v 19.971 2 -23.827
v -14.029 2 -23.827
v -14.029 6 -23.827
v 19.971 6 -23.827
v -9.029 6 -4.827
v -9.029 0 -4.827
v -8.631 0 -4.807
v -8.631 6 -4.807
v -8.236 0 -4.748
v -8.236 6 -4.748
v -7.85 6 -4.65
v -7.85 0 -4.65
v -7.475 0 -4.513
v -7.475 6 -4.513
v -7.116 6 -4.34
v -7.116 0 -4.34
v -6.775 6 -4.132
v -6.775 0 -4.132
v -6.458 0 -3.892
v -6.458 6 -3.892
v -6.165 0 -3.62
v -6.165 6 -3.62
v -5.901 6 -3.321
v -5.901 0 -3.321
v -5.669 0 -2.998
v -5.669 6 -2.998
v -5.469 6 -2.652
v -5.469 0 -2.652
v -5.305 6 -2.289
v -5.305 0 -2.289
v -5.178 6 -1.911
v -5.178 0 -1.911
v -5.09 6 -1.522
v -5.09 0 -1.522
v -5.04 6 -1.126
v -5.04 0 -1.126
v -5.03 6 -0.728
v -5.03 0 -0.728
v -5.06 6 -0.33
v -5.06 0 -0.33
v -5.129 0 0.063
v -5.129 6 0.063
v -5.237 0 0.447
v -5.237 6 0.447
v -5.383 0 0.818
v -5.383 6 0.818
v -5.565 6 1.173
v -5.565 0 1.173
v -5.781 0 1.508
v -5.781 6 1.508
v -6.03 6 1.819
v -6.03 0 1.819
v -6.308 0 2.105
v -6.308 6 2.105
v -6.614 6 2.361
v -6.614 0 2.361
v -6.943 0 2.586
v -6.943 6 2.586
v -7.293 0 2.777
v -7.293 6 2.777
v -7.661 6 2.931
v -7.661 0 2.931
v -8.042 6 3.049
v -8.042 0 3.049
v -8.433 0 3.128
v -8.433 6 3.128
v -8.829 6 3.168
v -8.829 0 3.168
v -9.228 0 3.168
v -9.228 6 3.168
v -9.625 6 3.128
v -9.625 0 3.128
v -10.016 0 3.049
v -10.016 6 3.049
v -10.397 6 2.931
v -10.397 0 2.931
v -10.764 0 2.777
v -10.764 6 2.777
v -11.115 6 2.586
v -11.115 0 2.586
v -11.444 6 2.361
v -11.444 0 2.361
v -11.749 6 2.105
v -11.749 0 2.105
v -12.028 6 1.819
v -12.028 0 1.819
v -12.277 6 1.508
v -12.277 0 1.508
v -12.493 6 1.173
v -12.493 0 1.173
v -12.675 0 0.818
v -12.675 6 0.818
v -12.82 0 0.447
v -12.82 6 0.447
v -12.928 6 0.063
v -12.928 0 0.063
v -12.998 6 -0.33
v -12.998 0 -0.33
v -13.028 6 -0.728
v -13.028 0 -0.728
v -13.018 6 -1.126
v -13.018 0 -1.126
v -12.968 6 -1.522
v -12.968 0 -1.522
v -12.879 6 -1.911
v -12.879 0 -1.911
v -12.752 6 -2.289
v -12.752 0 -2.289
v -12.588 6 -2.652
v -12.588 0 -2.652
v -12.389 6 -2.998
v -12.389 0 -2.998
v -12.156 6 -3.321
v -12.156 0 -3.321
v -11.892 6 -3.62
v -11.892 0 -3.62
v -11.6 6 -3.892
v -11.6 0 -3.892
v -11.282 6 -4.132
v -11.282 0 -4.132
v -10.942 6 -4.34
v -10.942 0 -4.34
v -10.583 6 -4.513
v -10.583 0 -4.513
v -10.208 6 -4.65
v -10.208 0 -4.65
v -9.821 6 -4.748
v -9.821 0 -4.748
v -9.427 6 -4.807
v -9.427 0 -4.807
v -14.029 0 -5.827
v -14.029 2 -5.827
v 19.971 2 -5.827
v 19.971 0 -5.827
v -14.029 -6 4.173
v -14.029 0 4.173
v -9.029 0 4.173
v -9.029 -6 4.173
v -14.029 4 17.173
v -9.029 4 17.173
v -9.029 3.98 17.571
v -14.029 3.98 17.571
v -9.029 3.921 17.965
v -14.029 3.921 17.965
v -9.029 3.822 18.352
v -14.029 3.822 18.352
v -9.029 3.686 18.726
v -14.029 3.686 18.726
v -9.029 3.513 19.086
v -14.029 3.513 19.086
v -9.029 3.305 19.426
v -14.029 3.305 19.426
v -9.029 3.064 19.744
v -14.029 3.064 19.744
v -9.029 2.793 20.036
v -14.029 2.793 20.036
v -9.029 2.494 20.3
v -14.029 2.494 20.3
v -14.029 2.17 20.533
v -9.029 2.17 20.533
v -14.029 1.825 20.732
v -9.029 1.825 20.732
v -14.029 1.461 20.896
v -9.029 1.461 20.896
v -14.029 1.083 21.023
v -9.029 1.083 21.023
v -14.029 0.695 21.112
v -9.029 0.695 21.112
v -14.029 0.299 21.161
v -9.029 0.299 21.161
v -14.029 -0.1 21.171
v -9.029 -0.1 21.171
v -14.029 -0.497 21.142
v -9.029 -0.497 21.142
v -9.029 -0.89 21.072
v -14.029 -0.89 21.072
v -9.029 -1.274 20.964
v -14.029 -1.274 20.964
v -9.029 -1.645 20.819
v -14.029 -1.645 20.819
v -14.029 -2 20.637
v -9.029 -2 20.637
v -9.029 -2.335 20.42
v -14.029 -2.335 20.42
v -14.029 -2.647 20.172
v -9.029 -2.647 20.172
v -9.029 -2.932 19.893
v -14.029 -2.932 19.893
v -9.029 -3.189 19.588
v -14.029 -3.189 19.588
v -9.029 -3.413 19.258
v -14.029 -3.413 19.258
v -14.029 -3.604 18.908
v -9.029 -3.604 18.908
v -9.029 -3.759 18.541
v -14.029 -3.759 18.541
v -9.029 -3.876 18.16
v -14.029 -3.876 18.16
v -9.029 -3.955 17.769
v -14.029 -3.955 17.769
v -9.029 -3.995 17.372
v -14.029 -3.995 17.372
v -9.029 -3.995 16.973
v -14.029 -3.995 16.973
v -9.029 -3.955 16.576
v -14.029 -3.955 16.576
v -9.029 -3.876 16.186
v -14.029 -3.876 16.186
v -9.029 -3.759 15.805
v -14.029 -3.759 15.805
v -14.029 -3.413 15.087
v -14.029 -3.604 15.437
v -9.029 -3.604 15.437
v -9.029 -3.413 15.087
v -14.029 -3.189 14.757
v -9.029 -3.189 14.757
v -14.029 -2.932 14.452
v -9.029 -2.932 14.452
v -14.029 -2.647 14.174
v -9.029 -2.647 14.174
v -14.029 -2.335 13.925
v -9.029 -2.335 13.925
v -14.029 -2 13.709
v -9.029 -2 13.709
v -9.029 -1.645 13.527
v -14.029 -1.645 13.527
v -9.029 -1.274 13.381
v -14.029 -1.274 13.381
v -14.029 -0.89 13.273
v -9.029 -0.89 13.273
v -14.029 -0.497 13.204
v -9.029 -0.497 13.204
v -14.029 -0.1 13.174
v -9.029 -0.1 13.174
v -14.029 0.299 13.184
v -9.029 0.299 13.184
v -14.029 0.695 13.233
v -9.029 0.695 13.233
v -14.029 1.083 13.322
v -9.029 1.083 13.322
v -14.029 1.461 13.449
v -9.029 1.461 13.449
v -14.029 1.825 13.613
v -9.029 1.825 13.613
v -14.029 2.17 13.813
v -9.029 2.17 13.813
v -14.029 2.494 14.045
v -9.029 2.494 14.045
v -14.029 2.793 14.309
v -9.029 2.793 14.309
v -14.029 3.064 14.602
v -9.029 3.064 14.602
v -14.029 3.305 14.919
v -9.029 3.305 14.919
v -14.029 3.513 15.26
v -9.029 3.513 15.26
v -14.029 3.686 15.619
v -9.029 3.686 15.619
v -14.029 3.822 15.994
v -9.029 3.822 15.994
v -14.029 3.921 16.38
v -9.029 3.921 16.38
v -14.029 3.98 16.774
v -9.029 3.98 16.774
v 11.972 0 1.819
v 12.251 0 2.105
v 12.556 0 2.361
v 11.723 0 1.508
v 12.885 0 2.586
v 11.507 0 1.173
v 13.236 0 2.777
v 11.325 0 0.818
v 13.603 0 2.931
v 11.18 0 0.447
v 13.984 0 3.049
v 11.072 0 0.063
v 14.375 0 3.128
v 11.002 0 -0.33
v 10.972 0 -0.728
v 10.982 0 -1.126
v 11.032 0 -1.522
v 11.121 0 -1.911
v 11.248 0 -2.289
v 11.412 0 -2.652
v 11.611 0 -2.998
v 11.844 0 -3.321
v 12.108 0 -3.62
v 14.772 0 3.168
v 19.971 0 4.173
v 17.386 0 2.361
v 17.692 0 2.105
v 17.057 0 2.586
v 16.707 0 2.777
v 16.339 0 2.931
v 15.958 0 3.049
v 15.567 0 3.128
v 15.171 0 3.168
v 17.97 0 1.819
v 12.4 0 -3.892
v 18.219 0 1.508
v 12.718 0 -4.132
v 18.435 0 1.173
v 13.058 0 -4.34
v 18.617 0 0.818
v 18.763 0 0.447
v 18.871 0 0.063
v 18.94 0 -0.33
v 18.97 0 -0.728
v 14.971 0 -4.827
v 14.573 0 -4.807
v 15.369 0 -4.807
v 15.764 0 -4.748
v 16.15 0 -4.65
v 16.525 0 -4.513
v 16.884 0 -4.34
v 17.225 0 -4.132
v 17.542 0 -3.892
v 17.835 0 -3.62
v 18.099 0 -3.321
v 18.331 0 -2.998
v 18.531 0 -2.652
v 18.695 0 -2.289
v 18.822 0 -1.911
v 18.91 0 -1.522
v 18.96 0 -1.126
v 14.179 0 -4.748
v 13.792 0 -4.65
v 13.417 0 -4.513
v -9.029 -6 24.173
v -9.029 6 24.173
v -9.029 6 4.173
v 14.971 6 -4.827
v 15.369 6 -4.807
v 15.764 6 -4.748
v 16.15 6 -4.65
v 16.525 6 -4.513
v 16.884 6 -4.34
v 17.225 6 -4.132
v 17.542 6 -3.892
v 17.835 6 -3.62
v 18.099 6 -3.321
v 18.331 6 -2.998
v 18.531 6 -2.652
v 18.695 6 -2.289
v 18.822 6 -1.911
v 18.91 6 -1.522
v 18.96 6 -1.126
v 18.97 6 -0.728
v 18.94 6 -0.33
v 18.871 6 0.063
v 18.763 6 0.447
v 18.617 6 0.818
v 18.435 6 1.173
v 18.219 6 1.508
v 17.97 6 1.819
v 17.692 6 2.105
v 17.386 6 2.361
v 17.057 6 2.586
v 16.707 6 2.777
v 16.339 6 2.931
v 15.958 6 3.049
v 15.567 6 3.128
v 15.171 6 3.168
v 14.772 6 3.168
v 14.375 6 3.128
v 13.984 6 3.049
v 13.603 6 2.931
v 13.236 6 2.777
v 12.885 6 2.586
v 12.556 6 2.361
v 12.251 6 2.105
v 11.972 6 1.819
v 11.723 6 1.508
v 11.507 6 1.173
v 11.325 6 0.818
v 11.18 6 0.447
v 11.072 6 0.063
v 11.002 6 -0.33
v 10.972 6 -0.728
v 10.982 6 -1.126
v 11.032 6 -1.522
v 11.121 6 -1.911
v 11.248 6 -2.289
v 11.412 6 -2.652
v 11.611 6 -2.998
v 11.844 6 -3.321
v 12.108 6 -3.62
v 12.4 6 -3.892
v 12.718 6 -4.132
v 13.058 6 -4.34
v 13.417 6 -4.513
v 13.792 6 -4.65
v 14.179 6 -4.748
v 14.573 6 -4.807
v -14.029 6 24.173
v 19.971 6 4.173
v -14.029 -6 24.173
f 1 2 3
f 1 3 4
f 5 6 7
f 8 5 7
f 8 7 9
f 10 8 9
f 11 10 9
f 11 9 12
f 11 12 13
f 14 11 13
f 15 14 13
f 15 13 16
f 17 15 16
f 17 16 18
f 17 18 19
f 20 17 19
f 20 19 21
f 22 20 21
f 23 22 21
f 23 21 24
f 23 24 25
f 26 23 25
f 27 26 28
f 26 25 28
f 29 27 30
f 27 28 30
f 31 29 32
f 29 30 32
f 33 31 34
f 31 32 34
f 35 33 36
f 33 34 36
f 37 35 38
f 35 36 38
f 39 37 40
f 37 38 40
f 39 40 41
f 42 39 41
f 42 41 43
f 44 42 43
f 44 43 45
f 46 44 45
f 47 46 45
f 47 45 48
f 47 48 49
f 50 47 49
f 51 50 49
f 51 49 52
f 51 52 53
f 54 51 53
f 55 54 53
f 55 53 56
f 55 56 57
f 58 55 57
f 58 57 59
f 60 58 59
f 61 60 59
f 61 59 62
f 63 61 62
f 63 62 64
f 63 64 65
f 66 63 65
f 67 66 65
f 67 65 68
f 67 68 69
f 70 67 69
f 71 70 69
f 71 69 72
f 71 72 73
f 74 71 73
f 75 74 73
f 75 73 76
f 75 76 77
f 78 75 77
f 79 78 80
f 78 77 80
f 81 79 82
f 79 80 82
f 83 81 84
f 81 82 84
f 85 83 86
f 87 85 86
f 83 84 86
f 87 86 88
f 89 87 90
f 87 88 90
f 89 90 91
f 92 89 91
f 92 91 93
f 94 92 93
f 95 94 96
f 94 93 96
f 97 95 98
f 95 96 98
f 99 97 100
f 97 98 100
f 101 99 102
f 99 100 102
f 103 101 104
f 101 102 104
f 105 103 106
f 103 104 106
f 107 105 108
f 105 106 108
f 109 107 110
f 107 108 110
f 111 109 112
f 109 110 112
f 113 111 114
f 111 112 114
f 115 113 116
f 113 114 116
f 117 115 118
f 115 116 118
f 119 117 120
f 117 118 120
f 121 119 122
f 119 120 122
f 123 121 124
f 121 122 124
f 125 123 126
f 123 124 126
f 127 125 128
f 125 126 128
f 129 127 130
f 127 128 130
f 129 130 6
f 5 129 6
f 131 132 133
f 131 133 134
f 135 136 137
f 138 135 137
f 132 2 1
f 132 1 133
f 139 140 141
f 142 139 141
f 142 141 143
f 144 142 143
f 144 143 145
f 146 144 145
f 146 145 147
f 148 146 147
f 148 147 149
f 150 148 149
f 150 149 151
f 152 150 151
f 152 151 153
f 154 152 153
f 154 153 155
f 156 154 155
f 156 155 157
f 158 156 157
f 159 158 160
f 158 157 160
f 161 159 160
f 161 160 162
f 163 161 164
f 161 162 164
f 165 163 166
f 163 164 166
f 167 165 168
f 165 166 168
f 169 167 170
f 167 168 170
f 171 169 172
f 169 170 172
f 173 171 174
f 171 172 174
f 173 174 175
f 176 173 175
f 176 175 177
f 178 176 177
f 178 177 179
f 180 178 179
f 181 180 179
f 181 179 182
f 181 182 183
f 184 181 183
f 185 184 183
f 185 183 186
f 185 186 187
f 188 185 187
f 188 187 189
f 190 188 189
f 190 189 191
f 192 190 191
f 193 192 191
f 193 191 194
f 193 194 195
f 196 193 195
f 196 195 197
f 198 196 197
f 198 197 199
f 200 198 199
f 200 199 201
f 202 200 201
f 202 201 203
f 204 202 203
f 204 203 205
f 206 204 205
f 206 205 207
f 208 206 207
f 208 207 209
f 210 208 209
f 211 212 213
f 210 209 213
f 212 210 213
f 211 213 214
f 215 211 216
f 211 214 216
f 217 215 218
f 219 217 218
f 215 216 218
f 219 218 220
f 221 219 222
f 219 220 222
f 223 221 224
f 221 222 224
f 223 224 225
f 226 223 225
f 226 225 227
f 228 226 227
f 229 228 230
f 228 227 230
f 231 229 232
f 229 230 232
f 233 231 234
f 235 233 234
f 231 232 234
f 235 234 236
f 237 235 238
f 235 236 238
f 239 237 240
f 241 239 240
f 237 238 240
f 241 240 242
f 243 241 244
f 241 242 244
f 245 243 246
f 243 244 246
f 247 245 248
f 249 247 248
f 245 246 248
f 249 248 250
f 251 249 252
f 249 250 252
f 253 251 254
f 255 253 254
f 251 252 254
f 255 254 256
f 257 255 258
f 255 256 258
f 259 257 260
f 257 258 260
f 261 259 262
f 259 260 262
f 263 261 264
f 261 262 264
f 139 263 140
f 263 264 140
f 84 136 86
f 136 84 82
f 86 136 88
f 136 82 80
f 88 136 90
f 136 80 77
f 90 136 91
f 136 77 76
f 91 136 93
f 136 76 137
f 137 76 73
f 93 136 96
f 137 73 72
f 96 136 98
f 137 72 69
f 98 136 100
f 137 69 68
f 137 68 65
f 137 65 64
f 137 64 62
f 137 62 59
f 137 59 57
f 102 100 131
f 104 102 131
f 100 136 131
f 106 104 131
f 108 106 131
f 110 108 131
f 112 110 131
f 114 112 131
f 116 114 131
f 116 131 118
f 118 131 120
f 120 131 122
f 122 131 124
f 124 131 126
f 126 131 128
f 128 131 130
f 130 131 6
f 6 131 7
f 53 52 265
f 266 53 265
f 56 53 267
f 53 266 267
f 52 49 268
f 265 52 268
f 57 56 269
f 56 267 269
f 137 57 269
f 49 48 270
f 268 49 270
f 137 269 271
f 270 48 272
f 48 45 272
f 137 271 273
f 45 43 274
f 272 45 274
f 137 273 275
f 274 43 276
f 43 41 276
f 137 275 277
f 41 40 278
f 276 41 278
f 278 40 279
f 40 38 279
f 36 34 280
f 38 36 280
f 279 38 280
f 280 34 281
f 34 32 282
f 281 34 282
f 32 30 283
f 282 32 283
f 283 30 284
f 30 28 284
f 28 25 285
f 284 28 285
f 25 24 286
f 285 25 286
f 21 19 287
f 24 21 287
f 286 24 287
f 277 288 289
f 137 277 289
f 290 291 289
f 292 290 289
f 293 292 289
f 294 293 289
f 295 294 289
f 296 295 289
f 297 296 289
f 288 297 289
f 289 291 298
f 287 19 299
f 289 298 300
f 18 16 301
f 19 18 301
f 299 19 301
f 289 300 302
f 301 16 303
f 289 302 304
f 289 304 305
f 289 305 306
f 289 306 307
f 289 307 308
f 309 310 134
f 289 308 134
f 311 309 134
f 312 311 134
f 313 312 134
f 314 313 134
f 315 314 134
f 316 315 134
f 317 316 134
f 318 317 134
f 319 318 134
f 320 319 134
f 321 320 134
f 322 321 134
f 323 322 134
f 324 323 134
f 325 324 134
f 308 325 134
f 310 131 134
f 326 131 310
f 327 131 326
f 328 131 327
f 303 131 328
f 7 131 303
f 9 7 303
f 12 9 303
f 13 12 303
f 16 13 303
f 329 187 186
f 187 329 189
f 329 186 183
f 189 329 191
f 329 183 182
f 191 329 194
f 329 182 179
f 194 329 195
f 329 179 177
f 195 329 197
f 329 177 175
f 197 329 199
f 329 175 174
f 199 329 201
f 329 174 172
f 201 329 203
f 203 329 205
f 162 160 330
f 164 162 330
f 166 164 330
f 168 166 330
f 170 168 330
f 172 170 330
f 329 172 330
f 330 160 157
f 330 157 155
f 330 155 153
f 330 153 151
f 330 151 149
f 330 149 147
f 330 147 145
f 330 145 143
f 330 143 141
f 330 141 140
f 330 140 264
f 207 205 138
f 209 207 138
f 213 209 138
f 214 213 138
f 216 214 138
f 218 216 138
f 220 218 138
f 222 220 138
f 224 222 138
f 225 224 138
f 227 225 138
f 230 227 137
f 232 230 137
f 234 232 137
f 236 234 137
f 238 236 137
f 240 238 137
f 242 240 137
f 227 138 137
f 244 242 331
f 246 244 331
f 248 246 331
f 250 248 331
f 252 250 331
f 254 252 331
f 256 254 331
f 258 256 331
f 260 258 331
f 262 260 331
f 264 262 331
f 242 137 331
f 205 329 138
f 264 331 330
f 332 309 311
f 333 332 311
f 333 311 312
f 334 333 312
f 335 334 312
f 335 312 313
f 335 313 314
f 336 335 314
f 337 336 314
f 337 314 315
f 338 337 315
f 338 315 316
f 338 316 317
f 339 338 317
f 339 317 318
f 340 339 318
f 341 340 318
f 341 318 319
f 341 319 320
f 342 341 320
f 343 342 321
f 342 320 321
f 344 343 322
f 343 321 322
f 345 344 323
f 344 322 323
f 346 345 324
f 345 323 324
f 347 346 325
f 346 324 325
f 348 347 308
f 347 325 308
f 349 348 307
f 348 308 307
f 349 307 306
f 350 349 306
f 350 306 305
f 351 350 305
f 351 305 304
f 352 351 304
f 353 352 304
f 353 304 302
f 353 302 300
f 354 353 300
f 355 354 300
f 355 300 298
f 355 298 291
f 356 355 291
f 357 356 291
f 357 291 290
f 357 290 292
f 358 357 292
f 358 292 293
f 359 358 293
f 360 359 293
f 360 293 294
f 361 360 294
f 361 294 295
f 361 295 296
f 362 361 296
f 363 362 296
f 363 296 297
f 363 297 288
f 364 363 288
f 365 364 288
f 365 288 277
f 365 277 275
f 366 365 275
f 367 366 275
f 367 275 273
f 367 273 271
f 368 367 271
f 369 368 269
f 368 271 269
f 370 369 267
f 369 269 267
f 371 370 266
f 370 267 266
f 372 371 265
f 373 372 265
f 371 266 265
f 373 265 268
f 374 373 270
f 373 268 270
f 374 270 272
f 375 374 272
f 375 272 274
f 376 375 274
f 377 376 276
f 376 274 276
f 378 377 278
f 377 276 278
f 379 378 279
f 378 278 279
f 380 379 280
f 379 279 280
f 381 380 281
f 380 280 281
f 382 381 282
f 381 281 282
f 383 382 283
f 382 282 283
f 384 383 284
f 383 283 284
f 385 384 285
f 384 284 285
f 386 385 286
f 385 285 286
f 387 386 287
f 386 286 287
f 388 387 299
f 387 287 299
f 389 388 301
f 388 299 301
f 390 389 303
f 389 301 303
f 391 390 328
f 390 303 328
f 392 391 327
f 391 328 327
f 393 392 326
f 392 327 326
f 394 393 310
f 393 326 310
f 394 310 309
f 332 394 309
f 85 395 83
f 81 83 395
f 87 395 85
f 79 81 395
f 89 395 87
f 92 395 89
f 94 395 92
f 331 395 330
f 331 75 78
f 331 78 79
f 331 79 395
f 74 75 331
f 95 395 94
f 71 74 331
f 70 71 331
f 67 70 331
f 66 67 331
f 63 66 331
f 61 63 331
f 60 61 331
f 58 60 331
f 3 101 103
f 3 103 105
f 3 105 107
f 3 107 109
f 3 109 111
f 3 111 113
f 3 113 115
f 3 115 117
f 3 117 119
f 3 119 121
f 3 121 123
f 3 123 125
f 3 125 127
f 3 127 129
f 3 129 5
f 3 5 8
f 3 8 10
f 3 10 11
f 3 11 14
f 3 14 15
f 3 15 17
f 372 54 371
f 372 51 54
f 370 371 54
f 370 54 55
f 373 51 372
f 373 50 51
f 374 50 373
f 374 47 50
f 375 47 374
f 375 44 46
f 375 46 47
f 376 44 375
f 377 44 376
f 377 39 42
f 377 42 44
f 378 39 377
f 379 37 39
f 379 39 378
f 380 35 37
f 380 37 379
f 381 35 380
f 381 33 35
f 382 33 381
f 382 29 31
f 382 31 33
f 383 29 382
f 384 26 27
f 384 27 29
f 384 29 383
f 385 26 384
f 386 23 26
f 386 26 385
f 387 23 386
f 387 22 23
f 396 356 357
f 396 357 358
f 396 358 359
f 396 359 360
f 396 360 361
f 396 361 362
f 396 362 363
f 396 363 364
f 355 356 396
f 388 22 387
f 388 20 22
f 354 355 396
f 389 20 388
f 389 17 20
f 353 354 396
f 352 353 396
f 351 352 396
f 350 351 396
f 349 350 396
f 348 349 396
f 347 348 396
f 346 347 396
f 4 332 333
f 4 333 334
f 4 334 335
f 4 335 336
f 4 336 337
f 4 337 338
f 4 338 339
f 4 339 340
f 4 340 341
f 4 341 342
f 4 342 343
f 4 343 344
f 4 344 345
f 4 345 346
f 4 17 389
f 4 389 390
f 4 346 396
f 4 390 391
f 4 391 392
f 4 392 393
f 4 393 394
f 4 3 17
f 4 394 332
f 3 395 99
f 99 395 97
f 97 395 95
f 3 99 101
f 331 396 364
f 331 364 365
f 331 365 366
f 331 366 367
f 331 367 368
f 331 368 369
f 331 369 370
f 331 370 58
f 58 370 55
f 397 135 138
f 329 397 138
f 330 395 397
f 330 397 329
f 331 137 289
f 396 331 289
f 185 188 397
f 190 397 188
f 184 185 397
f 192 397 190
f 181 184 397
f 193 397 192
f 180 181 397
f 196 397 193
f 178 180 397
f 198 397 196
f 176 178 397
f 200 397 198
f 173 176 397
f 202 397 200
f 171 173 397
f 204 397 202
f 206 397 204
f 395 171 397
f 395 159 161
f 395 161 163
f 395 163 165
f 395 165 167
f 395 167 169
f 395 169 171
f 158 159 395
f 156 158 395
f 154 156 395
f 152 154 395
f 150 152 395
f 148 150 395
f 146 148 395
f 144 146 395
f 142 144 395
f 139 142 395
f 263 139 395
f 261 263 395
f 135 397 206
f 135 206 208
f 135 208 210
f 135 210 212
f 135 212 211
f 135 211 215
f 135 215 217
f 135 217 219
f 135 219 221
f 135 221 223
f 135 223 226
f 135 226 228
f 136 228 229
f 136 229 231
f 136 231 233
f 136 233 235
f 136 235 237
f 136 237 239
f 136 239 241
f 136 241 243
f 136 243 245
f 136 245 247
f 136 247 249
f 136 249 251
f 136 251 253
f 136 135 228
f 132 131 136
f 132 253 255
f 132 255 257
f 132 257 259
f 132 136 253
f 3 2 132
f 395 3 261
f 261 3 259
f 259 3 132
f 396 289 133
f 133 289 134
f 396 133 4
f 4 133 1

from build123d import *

# Parameters (mm, degrees)
SKETCH_1_W               = 34
SKETCH_1_H               = 28
EXTRUDE_1_DEPTH          = 6
CUT_EXTRUDE_1_DEPTH      = 42.949279402
CUT_EXTRUDE_1_DEPTH_BACK = 42.949279402
CUT_EXTRUDE_3_REACH      = 33.664
SKETCH_5_R               = 4
SKETCH_9_W               = 5
SKETCH_9_H               = 12
EXTRUDE_4_DEPTH          = 20
CUT_EXTRUDE_4_REACH      = 40.227
SKETCH_10_R              = 4


with BuildPart() as part:
    # 草图1 → 凸台-拉伸1 (new body)
    with BuildSketch(Plane(origin=(0, 0, 0), x_dir=(1, 0, 0), z_dir=(0, 1, 0))):
        with Locations((2.971223022, 9.827338129)):
            Rectangle(SKETCH_1_W, SKETCH_1_H)
    extrude(amount=EXTRUDE_1_DEPTH)

    # 草图2 → 切除-拉伸1 (cut, two sides: drawn at the far end of the back side and taken through both)
    with BuildSketch(Plane(origin=(19.971223022, 0, 0), x_dir=(0, 0, -1), z_dir=(1, 0, 0)).offset(-CUT_EXTRUDE_1_DEPTH_BACK)):
        Polygon((90.395880624, 2), (23.827338129, 2), (5.827338129, 2), (5.827338129, 0), (5.827338129, -66.568542495), (89.676932139, -169.983865267), (174.245474634, -101.415322772), align=None)
    extrude(amount=CUT_EXTRUDE_1_DEPTH + CUT_EXTRUDE_1_DEPTH_BACK, mode=Mode.SUBTRACT)

    # 草图5 → 切除-拉伸3 (cut, up to next)
    with BuildSketch(Plane.XZ, mode=Mode.PRIVATE) as cut_extrude_3_sk1:
        with Locations(Location((-9.028776978, -0.827338129, 0), (0, 0, 270))):
            Circle(SKETCH_5_R)
    cut_extrude_3_tool1 = extrude(cut_extrude_3_sk1.sketch, amount=-CUT_EXTRUDE_3_REACH, mode=Mode.PRIVATE) & part.part
    # 草图5 → 切除-拉伸3 (cut, up to next)
    with BuildSketch(Plane.XZ, mode=Mode.PRIVATE) as cut_extrude_3_sk2:
        with Locations(Location((14.971223022, -0.827338129, 0), (0, 0, 270))):
            Circle(SKETCH_5_R)
    cut_extrude_3_tool2 = extrude(cut_extrude_3_sk2.sketch, amount=-CUT_EXTRUDE_3_REACH, mode=Mode.PRIVATE) & part.part
    add(cut_extrude_3_tool1.solids().sort_by_distance((-9.028777, 0, -0.827338))[0], mode=Mode.SUBTRACT)
    add(cut_extrude_3_tool2.solids().sort_by_distance((14.971223, 0, -0.827338))[0], mode=Mode.SUBTRACT)

    # 草图9 → 凸台-拉伸4 (add)
    with BuildSketch(Plane.XY.offset(4.172661871)):
        with Locations((-11.528776978, 0)):
            Rectangle(SKETCH_9_W, SKETCH_9_H)
    extrude(amount=EXTRUDE_4_DEPTH)

    # 草图10 → 切除-拉伸4 (cut, up to next)
    with BuildSketch(Plane(origin=(-9.028776978, 0, 0), x_dir=(0, 0, -1), z_dir=(1, 0, 0)), mode=Mode.PRIVATE) as cut_extrude_4_sk1:
        with Locations(Location((-17.172661871, 0, 0), (0, 0, 90))):
            Circle(SKETCH_10_R)
    cut_extrude_4_tool1 = extrude(cut_extrude_4_sk1.sketch, amount=-CUT_EXTRUDE_4_REACH, mode=Mode.PRIVATE) & part.part
    add(cut_extrude_4_tool1.solids().sort_by_distance((-9.028777, 0, 17.172662))[0], mode=Mode.SUBTRACT)


solid = part.part
